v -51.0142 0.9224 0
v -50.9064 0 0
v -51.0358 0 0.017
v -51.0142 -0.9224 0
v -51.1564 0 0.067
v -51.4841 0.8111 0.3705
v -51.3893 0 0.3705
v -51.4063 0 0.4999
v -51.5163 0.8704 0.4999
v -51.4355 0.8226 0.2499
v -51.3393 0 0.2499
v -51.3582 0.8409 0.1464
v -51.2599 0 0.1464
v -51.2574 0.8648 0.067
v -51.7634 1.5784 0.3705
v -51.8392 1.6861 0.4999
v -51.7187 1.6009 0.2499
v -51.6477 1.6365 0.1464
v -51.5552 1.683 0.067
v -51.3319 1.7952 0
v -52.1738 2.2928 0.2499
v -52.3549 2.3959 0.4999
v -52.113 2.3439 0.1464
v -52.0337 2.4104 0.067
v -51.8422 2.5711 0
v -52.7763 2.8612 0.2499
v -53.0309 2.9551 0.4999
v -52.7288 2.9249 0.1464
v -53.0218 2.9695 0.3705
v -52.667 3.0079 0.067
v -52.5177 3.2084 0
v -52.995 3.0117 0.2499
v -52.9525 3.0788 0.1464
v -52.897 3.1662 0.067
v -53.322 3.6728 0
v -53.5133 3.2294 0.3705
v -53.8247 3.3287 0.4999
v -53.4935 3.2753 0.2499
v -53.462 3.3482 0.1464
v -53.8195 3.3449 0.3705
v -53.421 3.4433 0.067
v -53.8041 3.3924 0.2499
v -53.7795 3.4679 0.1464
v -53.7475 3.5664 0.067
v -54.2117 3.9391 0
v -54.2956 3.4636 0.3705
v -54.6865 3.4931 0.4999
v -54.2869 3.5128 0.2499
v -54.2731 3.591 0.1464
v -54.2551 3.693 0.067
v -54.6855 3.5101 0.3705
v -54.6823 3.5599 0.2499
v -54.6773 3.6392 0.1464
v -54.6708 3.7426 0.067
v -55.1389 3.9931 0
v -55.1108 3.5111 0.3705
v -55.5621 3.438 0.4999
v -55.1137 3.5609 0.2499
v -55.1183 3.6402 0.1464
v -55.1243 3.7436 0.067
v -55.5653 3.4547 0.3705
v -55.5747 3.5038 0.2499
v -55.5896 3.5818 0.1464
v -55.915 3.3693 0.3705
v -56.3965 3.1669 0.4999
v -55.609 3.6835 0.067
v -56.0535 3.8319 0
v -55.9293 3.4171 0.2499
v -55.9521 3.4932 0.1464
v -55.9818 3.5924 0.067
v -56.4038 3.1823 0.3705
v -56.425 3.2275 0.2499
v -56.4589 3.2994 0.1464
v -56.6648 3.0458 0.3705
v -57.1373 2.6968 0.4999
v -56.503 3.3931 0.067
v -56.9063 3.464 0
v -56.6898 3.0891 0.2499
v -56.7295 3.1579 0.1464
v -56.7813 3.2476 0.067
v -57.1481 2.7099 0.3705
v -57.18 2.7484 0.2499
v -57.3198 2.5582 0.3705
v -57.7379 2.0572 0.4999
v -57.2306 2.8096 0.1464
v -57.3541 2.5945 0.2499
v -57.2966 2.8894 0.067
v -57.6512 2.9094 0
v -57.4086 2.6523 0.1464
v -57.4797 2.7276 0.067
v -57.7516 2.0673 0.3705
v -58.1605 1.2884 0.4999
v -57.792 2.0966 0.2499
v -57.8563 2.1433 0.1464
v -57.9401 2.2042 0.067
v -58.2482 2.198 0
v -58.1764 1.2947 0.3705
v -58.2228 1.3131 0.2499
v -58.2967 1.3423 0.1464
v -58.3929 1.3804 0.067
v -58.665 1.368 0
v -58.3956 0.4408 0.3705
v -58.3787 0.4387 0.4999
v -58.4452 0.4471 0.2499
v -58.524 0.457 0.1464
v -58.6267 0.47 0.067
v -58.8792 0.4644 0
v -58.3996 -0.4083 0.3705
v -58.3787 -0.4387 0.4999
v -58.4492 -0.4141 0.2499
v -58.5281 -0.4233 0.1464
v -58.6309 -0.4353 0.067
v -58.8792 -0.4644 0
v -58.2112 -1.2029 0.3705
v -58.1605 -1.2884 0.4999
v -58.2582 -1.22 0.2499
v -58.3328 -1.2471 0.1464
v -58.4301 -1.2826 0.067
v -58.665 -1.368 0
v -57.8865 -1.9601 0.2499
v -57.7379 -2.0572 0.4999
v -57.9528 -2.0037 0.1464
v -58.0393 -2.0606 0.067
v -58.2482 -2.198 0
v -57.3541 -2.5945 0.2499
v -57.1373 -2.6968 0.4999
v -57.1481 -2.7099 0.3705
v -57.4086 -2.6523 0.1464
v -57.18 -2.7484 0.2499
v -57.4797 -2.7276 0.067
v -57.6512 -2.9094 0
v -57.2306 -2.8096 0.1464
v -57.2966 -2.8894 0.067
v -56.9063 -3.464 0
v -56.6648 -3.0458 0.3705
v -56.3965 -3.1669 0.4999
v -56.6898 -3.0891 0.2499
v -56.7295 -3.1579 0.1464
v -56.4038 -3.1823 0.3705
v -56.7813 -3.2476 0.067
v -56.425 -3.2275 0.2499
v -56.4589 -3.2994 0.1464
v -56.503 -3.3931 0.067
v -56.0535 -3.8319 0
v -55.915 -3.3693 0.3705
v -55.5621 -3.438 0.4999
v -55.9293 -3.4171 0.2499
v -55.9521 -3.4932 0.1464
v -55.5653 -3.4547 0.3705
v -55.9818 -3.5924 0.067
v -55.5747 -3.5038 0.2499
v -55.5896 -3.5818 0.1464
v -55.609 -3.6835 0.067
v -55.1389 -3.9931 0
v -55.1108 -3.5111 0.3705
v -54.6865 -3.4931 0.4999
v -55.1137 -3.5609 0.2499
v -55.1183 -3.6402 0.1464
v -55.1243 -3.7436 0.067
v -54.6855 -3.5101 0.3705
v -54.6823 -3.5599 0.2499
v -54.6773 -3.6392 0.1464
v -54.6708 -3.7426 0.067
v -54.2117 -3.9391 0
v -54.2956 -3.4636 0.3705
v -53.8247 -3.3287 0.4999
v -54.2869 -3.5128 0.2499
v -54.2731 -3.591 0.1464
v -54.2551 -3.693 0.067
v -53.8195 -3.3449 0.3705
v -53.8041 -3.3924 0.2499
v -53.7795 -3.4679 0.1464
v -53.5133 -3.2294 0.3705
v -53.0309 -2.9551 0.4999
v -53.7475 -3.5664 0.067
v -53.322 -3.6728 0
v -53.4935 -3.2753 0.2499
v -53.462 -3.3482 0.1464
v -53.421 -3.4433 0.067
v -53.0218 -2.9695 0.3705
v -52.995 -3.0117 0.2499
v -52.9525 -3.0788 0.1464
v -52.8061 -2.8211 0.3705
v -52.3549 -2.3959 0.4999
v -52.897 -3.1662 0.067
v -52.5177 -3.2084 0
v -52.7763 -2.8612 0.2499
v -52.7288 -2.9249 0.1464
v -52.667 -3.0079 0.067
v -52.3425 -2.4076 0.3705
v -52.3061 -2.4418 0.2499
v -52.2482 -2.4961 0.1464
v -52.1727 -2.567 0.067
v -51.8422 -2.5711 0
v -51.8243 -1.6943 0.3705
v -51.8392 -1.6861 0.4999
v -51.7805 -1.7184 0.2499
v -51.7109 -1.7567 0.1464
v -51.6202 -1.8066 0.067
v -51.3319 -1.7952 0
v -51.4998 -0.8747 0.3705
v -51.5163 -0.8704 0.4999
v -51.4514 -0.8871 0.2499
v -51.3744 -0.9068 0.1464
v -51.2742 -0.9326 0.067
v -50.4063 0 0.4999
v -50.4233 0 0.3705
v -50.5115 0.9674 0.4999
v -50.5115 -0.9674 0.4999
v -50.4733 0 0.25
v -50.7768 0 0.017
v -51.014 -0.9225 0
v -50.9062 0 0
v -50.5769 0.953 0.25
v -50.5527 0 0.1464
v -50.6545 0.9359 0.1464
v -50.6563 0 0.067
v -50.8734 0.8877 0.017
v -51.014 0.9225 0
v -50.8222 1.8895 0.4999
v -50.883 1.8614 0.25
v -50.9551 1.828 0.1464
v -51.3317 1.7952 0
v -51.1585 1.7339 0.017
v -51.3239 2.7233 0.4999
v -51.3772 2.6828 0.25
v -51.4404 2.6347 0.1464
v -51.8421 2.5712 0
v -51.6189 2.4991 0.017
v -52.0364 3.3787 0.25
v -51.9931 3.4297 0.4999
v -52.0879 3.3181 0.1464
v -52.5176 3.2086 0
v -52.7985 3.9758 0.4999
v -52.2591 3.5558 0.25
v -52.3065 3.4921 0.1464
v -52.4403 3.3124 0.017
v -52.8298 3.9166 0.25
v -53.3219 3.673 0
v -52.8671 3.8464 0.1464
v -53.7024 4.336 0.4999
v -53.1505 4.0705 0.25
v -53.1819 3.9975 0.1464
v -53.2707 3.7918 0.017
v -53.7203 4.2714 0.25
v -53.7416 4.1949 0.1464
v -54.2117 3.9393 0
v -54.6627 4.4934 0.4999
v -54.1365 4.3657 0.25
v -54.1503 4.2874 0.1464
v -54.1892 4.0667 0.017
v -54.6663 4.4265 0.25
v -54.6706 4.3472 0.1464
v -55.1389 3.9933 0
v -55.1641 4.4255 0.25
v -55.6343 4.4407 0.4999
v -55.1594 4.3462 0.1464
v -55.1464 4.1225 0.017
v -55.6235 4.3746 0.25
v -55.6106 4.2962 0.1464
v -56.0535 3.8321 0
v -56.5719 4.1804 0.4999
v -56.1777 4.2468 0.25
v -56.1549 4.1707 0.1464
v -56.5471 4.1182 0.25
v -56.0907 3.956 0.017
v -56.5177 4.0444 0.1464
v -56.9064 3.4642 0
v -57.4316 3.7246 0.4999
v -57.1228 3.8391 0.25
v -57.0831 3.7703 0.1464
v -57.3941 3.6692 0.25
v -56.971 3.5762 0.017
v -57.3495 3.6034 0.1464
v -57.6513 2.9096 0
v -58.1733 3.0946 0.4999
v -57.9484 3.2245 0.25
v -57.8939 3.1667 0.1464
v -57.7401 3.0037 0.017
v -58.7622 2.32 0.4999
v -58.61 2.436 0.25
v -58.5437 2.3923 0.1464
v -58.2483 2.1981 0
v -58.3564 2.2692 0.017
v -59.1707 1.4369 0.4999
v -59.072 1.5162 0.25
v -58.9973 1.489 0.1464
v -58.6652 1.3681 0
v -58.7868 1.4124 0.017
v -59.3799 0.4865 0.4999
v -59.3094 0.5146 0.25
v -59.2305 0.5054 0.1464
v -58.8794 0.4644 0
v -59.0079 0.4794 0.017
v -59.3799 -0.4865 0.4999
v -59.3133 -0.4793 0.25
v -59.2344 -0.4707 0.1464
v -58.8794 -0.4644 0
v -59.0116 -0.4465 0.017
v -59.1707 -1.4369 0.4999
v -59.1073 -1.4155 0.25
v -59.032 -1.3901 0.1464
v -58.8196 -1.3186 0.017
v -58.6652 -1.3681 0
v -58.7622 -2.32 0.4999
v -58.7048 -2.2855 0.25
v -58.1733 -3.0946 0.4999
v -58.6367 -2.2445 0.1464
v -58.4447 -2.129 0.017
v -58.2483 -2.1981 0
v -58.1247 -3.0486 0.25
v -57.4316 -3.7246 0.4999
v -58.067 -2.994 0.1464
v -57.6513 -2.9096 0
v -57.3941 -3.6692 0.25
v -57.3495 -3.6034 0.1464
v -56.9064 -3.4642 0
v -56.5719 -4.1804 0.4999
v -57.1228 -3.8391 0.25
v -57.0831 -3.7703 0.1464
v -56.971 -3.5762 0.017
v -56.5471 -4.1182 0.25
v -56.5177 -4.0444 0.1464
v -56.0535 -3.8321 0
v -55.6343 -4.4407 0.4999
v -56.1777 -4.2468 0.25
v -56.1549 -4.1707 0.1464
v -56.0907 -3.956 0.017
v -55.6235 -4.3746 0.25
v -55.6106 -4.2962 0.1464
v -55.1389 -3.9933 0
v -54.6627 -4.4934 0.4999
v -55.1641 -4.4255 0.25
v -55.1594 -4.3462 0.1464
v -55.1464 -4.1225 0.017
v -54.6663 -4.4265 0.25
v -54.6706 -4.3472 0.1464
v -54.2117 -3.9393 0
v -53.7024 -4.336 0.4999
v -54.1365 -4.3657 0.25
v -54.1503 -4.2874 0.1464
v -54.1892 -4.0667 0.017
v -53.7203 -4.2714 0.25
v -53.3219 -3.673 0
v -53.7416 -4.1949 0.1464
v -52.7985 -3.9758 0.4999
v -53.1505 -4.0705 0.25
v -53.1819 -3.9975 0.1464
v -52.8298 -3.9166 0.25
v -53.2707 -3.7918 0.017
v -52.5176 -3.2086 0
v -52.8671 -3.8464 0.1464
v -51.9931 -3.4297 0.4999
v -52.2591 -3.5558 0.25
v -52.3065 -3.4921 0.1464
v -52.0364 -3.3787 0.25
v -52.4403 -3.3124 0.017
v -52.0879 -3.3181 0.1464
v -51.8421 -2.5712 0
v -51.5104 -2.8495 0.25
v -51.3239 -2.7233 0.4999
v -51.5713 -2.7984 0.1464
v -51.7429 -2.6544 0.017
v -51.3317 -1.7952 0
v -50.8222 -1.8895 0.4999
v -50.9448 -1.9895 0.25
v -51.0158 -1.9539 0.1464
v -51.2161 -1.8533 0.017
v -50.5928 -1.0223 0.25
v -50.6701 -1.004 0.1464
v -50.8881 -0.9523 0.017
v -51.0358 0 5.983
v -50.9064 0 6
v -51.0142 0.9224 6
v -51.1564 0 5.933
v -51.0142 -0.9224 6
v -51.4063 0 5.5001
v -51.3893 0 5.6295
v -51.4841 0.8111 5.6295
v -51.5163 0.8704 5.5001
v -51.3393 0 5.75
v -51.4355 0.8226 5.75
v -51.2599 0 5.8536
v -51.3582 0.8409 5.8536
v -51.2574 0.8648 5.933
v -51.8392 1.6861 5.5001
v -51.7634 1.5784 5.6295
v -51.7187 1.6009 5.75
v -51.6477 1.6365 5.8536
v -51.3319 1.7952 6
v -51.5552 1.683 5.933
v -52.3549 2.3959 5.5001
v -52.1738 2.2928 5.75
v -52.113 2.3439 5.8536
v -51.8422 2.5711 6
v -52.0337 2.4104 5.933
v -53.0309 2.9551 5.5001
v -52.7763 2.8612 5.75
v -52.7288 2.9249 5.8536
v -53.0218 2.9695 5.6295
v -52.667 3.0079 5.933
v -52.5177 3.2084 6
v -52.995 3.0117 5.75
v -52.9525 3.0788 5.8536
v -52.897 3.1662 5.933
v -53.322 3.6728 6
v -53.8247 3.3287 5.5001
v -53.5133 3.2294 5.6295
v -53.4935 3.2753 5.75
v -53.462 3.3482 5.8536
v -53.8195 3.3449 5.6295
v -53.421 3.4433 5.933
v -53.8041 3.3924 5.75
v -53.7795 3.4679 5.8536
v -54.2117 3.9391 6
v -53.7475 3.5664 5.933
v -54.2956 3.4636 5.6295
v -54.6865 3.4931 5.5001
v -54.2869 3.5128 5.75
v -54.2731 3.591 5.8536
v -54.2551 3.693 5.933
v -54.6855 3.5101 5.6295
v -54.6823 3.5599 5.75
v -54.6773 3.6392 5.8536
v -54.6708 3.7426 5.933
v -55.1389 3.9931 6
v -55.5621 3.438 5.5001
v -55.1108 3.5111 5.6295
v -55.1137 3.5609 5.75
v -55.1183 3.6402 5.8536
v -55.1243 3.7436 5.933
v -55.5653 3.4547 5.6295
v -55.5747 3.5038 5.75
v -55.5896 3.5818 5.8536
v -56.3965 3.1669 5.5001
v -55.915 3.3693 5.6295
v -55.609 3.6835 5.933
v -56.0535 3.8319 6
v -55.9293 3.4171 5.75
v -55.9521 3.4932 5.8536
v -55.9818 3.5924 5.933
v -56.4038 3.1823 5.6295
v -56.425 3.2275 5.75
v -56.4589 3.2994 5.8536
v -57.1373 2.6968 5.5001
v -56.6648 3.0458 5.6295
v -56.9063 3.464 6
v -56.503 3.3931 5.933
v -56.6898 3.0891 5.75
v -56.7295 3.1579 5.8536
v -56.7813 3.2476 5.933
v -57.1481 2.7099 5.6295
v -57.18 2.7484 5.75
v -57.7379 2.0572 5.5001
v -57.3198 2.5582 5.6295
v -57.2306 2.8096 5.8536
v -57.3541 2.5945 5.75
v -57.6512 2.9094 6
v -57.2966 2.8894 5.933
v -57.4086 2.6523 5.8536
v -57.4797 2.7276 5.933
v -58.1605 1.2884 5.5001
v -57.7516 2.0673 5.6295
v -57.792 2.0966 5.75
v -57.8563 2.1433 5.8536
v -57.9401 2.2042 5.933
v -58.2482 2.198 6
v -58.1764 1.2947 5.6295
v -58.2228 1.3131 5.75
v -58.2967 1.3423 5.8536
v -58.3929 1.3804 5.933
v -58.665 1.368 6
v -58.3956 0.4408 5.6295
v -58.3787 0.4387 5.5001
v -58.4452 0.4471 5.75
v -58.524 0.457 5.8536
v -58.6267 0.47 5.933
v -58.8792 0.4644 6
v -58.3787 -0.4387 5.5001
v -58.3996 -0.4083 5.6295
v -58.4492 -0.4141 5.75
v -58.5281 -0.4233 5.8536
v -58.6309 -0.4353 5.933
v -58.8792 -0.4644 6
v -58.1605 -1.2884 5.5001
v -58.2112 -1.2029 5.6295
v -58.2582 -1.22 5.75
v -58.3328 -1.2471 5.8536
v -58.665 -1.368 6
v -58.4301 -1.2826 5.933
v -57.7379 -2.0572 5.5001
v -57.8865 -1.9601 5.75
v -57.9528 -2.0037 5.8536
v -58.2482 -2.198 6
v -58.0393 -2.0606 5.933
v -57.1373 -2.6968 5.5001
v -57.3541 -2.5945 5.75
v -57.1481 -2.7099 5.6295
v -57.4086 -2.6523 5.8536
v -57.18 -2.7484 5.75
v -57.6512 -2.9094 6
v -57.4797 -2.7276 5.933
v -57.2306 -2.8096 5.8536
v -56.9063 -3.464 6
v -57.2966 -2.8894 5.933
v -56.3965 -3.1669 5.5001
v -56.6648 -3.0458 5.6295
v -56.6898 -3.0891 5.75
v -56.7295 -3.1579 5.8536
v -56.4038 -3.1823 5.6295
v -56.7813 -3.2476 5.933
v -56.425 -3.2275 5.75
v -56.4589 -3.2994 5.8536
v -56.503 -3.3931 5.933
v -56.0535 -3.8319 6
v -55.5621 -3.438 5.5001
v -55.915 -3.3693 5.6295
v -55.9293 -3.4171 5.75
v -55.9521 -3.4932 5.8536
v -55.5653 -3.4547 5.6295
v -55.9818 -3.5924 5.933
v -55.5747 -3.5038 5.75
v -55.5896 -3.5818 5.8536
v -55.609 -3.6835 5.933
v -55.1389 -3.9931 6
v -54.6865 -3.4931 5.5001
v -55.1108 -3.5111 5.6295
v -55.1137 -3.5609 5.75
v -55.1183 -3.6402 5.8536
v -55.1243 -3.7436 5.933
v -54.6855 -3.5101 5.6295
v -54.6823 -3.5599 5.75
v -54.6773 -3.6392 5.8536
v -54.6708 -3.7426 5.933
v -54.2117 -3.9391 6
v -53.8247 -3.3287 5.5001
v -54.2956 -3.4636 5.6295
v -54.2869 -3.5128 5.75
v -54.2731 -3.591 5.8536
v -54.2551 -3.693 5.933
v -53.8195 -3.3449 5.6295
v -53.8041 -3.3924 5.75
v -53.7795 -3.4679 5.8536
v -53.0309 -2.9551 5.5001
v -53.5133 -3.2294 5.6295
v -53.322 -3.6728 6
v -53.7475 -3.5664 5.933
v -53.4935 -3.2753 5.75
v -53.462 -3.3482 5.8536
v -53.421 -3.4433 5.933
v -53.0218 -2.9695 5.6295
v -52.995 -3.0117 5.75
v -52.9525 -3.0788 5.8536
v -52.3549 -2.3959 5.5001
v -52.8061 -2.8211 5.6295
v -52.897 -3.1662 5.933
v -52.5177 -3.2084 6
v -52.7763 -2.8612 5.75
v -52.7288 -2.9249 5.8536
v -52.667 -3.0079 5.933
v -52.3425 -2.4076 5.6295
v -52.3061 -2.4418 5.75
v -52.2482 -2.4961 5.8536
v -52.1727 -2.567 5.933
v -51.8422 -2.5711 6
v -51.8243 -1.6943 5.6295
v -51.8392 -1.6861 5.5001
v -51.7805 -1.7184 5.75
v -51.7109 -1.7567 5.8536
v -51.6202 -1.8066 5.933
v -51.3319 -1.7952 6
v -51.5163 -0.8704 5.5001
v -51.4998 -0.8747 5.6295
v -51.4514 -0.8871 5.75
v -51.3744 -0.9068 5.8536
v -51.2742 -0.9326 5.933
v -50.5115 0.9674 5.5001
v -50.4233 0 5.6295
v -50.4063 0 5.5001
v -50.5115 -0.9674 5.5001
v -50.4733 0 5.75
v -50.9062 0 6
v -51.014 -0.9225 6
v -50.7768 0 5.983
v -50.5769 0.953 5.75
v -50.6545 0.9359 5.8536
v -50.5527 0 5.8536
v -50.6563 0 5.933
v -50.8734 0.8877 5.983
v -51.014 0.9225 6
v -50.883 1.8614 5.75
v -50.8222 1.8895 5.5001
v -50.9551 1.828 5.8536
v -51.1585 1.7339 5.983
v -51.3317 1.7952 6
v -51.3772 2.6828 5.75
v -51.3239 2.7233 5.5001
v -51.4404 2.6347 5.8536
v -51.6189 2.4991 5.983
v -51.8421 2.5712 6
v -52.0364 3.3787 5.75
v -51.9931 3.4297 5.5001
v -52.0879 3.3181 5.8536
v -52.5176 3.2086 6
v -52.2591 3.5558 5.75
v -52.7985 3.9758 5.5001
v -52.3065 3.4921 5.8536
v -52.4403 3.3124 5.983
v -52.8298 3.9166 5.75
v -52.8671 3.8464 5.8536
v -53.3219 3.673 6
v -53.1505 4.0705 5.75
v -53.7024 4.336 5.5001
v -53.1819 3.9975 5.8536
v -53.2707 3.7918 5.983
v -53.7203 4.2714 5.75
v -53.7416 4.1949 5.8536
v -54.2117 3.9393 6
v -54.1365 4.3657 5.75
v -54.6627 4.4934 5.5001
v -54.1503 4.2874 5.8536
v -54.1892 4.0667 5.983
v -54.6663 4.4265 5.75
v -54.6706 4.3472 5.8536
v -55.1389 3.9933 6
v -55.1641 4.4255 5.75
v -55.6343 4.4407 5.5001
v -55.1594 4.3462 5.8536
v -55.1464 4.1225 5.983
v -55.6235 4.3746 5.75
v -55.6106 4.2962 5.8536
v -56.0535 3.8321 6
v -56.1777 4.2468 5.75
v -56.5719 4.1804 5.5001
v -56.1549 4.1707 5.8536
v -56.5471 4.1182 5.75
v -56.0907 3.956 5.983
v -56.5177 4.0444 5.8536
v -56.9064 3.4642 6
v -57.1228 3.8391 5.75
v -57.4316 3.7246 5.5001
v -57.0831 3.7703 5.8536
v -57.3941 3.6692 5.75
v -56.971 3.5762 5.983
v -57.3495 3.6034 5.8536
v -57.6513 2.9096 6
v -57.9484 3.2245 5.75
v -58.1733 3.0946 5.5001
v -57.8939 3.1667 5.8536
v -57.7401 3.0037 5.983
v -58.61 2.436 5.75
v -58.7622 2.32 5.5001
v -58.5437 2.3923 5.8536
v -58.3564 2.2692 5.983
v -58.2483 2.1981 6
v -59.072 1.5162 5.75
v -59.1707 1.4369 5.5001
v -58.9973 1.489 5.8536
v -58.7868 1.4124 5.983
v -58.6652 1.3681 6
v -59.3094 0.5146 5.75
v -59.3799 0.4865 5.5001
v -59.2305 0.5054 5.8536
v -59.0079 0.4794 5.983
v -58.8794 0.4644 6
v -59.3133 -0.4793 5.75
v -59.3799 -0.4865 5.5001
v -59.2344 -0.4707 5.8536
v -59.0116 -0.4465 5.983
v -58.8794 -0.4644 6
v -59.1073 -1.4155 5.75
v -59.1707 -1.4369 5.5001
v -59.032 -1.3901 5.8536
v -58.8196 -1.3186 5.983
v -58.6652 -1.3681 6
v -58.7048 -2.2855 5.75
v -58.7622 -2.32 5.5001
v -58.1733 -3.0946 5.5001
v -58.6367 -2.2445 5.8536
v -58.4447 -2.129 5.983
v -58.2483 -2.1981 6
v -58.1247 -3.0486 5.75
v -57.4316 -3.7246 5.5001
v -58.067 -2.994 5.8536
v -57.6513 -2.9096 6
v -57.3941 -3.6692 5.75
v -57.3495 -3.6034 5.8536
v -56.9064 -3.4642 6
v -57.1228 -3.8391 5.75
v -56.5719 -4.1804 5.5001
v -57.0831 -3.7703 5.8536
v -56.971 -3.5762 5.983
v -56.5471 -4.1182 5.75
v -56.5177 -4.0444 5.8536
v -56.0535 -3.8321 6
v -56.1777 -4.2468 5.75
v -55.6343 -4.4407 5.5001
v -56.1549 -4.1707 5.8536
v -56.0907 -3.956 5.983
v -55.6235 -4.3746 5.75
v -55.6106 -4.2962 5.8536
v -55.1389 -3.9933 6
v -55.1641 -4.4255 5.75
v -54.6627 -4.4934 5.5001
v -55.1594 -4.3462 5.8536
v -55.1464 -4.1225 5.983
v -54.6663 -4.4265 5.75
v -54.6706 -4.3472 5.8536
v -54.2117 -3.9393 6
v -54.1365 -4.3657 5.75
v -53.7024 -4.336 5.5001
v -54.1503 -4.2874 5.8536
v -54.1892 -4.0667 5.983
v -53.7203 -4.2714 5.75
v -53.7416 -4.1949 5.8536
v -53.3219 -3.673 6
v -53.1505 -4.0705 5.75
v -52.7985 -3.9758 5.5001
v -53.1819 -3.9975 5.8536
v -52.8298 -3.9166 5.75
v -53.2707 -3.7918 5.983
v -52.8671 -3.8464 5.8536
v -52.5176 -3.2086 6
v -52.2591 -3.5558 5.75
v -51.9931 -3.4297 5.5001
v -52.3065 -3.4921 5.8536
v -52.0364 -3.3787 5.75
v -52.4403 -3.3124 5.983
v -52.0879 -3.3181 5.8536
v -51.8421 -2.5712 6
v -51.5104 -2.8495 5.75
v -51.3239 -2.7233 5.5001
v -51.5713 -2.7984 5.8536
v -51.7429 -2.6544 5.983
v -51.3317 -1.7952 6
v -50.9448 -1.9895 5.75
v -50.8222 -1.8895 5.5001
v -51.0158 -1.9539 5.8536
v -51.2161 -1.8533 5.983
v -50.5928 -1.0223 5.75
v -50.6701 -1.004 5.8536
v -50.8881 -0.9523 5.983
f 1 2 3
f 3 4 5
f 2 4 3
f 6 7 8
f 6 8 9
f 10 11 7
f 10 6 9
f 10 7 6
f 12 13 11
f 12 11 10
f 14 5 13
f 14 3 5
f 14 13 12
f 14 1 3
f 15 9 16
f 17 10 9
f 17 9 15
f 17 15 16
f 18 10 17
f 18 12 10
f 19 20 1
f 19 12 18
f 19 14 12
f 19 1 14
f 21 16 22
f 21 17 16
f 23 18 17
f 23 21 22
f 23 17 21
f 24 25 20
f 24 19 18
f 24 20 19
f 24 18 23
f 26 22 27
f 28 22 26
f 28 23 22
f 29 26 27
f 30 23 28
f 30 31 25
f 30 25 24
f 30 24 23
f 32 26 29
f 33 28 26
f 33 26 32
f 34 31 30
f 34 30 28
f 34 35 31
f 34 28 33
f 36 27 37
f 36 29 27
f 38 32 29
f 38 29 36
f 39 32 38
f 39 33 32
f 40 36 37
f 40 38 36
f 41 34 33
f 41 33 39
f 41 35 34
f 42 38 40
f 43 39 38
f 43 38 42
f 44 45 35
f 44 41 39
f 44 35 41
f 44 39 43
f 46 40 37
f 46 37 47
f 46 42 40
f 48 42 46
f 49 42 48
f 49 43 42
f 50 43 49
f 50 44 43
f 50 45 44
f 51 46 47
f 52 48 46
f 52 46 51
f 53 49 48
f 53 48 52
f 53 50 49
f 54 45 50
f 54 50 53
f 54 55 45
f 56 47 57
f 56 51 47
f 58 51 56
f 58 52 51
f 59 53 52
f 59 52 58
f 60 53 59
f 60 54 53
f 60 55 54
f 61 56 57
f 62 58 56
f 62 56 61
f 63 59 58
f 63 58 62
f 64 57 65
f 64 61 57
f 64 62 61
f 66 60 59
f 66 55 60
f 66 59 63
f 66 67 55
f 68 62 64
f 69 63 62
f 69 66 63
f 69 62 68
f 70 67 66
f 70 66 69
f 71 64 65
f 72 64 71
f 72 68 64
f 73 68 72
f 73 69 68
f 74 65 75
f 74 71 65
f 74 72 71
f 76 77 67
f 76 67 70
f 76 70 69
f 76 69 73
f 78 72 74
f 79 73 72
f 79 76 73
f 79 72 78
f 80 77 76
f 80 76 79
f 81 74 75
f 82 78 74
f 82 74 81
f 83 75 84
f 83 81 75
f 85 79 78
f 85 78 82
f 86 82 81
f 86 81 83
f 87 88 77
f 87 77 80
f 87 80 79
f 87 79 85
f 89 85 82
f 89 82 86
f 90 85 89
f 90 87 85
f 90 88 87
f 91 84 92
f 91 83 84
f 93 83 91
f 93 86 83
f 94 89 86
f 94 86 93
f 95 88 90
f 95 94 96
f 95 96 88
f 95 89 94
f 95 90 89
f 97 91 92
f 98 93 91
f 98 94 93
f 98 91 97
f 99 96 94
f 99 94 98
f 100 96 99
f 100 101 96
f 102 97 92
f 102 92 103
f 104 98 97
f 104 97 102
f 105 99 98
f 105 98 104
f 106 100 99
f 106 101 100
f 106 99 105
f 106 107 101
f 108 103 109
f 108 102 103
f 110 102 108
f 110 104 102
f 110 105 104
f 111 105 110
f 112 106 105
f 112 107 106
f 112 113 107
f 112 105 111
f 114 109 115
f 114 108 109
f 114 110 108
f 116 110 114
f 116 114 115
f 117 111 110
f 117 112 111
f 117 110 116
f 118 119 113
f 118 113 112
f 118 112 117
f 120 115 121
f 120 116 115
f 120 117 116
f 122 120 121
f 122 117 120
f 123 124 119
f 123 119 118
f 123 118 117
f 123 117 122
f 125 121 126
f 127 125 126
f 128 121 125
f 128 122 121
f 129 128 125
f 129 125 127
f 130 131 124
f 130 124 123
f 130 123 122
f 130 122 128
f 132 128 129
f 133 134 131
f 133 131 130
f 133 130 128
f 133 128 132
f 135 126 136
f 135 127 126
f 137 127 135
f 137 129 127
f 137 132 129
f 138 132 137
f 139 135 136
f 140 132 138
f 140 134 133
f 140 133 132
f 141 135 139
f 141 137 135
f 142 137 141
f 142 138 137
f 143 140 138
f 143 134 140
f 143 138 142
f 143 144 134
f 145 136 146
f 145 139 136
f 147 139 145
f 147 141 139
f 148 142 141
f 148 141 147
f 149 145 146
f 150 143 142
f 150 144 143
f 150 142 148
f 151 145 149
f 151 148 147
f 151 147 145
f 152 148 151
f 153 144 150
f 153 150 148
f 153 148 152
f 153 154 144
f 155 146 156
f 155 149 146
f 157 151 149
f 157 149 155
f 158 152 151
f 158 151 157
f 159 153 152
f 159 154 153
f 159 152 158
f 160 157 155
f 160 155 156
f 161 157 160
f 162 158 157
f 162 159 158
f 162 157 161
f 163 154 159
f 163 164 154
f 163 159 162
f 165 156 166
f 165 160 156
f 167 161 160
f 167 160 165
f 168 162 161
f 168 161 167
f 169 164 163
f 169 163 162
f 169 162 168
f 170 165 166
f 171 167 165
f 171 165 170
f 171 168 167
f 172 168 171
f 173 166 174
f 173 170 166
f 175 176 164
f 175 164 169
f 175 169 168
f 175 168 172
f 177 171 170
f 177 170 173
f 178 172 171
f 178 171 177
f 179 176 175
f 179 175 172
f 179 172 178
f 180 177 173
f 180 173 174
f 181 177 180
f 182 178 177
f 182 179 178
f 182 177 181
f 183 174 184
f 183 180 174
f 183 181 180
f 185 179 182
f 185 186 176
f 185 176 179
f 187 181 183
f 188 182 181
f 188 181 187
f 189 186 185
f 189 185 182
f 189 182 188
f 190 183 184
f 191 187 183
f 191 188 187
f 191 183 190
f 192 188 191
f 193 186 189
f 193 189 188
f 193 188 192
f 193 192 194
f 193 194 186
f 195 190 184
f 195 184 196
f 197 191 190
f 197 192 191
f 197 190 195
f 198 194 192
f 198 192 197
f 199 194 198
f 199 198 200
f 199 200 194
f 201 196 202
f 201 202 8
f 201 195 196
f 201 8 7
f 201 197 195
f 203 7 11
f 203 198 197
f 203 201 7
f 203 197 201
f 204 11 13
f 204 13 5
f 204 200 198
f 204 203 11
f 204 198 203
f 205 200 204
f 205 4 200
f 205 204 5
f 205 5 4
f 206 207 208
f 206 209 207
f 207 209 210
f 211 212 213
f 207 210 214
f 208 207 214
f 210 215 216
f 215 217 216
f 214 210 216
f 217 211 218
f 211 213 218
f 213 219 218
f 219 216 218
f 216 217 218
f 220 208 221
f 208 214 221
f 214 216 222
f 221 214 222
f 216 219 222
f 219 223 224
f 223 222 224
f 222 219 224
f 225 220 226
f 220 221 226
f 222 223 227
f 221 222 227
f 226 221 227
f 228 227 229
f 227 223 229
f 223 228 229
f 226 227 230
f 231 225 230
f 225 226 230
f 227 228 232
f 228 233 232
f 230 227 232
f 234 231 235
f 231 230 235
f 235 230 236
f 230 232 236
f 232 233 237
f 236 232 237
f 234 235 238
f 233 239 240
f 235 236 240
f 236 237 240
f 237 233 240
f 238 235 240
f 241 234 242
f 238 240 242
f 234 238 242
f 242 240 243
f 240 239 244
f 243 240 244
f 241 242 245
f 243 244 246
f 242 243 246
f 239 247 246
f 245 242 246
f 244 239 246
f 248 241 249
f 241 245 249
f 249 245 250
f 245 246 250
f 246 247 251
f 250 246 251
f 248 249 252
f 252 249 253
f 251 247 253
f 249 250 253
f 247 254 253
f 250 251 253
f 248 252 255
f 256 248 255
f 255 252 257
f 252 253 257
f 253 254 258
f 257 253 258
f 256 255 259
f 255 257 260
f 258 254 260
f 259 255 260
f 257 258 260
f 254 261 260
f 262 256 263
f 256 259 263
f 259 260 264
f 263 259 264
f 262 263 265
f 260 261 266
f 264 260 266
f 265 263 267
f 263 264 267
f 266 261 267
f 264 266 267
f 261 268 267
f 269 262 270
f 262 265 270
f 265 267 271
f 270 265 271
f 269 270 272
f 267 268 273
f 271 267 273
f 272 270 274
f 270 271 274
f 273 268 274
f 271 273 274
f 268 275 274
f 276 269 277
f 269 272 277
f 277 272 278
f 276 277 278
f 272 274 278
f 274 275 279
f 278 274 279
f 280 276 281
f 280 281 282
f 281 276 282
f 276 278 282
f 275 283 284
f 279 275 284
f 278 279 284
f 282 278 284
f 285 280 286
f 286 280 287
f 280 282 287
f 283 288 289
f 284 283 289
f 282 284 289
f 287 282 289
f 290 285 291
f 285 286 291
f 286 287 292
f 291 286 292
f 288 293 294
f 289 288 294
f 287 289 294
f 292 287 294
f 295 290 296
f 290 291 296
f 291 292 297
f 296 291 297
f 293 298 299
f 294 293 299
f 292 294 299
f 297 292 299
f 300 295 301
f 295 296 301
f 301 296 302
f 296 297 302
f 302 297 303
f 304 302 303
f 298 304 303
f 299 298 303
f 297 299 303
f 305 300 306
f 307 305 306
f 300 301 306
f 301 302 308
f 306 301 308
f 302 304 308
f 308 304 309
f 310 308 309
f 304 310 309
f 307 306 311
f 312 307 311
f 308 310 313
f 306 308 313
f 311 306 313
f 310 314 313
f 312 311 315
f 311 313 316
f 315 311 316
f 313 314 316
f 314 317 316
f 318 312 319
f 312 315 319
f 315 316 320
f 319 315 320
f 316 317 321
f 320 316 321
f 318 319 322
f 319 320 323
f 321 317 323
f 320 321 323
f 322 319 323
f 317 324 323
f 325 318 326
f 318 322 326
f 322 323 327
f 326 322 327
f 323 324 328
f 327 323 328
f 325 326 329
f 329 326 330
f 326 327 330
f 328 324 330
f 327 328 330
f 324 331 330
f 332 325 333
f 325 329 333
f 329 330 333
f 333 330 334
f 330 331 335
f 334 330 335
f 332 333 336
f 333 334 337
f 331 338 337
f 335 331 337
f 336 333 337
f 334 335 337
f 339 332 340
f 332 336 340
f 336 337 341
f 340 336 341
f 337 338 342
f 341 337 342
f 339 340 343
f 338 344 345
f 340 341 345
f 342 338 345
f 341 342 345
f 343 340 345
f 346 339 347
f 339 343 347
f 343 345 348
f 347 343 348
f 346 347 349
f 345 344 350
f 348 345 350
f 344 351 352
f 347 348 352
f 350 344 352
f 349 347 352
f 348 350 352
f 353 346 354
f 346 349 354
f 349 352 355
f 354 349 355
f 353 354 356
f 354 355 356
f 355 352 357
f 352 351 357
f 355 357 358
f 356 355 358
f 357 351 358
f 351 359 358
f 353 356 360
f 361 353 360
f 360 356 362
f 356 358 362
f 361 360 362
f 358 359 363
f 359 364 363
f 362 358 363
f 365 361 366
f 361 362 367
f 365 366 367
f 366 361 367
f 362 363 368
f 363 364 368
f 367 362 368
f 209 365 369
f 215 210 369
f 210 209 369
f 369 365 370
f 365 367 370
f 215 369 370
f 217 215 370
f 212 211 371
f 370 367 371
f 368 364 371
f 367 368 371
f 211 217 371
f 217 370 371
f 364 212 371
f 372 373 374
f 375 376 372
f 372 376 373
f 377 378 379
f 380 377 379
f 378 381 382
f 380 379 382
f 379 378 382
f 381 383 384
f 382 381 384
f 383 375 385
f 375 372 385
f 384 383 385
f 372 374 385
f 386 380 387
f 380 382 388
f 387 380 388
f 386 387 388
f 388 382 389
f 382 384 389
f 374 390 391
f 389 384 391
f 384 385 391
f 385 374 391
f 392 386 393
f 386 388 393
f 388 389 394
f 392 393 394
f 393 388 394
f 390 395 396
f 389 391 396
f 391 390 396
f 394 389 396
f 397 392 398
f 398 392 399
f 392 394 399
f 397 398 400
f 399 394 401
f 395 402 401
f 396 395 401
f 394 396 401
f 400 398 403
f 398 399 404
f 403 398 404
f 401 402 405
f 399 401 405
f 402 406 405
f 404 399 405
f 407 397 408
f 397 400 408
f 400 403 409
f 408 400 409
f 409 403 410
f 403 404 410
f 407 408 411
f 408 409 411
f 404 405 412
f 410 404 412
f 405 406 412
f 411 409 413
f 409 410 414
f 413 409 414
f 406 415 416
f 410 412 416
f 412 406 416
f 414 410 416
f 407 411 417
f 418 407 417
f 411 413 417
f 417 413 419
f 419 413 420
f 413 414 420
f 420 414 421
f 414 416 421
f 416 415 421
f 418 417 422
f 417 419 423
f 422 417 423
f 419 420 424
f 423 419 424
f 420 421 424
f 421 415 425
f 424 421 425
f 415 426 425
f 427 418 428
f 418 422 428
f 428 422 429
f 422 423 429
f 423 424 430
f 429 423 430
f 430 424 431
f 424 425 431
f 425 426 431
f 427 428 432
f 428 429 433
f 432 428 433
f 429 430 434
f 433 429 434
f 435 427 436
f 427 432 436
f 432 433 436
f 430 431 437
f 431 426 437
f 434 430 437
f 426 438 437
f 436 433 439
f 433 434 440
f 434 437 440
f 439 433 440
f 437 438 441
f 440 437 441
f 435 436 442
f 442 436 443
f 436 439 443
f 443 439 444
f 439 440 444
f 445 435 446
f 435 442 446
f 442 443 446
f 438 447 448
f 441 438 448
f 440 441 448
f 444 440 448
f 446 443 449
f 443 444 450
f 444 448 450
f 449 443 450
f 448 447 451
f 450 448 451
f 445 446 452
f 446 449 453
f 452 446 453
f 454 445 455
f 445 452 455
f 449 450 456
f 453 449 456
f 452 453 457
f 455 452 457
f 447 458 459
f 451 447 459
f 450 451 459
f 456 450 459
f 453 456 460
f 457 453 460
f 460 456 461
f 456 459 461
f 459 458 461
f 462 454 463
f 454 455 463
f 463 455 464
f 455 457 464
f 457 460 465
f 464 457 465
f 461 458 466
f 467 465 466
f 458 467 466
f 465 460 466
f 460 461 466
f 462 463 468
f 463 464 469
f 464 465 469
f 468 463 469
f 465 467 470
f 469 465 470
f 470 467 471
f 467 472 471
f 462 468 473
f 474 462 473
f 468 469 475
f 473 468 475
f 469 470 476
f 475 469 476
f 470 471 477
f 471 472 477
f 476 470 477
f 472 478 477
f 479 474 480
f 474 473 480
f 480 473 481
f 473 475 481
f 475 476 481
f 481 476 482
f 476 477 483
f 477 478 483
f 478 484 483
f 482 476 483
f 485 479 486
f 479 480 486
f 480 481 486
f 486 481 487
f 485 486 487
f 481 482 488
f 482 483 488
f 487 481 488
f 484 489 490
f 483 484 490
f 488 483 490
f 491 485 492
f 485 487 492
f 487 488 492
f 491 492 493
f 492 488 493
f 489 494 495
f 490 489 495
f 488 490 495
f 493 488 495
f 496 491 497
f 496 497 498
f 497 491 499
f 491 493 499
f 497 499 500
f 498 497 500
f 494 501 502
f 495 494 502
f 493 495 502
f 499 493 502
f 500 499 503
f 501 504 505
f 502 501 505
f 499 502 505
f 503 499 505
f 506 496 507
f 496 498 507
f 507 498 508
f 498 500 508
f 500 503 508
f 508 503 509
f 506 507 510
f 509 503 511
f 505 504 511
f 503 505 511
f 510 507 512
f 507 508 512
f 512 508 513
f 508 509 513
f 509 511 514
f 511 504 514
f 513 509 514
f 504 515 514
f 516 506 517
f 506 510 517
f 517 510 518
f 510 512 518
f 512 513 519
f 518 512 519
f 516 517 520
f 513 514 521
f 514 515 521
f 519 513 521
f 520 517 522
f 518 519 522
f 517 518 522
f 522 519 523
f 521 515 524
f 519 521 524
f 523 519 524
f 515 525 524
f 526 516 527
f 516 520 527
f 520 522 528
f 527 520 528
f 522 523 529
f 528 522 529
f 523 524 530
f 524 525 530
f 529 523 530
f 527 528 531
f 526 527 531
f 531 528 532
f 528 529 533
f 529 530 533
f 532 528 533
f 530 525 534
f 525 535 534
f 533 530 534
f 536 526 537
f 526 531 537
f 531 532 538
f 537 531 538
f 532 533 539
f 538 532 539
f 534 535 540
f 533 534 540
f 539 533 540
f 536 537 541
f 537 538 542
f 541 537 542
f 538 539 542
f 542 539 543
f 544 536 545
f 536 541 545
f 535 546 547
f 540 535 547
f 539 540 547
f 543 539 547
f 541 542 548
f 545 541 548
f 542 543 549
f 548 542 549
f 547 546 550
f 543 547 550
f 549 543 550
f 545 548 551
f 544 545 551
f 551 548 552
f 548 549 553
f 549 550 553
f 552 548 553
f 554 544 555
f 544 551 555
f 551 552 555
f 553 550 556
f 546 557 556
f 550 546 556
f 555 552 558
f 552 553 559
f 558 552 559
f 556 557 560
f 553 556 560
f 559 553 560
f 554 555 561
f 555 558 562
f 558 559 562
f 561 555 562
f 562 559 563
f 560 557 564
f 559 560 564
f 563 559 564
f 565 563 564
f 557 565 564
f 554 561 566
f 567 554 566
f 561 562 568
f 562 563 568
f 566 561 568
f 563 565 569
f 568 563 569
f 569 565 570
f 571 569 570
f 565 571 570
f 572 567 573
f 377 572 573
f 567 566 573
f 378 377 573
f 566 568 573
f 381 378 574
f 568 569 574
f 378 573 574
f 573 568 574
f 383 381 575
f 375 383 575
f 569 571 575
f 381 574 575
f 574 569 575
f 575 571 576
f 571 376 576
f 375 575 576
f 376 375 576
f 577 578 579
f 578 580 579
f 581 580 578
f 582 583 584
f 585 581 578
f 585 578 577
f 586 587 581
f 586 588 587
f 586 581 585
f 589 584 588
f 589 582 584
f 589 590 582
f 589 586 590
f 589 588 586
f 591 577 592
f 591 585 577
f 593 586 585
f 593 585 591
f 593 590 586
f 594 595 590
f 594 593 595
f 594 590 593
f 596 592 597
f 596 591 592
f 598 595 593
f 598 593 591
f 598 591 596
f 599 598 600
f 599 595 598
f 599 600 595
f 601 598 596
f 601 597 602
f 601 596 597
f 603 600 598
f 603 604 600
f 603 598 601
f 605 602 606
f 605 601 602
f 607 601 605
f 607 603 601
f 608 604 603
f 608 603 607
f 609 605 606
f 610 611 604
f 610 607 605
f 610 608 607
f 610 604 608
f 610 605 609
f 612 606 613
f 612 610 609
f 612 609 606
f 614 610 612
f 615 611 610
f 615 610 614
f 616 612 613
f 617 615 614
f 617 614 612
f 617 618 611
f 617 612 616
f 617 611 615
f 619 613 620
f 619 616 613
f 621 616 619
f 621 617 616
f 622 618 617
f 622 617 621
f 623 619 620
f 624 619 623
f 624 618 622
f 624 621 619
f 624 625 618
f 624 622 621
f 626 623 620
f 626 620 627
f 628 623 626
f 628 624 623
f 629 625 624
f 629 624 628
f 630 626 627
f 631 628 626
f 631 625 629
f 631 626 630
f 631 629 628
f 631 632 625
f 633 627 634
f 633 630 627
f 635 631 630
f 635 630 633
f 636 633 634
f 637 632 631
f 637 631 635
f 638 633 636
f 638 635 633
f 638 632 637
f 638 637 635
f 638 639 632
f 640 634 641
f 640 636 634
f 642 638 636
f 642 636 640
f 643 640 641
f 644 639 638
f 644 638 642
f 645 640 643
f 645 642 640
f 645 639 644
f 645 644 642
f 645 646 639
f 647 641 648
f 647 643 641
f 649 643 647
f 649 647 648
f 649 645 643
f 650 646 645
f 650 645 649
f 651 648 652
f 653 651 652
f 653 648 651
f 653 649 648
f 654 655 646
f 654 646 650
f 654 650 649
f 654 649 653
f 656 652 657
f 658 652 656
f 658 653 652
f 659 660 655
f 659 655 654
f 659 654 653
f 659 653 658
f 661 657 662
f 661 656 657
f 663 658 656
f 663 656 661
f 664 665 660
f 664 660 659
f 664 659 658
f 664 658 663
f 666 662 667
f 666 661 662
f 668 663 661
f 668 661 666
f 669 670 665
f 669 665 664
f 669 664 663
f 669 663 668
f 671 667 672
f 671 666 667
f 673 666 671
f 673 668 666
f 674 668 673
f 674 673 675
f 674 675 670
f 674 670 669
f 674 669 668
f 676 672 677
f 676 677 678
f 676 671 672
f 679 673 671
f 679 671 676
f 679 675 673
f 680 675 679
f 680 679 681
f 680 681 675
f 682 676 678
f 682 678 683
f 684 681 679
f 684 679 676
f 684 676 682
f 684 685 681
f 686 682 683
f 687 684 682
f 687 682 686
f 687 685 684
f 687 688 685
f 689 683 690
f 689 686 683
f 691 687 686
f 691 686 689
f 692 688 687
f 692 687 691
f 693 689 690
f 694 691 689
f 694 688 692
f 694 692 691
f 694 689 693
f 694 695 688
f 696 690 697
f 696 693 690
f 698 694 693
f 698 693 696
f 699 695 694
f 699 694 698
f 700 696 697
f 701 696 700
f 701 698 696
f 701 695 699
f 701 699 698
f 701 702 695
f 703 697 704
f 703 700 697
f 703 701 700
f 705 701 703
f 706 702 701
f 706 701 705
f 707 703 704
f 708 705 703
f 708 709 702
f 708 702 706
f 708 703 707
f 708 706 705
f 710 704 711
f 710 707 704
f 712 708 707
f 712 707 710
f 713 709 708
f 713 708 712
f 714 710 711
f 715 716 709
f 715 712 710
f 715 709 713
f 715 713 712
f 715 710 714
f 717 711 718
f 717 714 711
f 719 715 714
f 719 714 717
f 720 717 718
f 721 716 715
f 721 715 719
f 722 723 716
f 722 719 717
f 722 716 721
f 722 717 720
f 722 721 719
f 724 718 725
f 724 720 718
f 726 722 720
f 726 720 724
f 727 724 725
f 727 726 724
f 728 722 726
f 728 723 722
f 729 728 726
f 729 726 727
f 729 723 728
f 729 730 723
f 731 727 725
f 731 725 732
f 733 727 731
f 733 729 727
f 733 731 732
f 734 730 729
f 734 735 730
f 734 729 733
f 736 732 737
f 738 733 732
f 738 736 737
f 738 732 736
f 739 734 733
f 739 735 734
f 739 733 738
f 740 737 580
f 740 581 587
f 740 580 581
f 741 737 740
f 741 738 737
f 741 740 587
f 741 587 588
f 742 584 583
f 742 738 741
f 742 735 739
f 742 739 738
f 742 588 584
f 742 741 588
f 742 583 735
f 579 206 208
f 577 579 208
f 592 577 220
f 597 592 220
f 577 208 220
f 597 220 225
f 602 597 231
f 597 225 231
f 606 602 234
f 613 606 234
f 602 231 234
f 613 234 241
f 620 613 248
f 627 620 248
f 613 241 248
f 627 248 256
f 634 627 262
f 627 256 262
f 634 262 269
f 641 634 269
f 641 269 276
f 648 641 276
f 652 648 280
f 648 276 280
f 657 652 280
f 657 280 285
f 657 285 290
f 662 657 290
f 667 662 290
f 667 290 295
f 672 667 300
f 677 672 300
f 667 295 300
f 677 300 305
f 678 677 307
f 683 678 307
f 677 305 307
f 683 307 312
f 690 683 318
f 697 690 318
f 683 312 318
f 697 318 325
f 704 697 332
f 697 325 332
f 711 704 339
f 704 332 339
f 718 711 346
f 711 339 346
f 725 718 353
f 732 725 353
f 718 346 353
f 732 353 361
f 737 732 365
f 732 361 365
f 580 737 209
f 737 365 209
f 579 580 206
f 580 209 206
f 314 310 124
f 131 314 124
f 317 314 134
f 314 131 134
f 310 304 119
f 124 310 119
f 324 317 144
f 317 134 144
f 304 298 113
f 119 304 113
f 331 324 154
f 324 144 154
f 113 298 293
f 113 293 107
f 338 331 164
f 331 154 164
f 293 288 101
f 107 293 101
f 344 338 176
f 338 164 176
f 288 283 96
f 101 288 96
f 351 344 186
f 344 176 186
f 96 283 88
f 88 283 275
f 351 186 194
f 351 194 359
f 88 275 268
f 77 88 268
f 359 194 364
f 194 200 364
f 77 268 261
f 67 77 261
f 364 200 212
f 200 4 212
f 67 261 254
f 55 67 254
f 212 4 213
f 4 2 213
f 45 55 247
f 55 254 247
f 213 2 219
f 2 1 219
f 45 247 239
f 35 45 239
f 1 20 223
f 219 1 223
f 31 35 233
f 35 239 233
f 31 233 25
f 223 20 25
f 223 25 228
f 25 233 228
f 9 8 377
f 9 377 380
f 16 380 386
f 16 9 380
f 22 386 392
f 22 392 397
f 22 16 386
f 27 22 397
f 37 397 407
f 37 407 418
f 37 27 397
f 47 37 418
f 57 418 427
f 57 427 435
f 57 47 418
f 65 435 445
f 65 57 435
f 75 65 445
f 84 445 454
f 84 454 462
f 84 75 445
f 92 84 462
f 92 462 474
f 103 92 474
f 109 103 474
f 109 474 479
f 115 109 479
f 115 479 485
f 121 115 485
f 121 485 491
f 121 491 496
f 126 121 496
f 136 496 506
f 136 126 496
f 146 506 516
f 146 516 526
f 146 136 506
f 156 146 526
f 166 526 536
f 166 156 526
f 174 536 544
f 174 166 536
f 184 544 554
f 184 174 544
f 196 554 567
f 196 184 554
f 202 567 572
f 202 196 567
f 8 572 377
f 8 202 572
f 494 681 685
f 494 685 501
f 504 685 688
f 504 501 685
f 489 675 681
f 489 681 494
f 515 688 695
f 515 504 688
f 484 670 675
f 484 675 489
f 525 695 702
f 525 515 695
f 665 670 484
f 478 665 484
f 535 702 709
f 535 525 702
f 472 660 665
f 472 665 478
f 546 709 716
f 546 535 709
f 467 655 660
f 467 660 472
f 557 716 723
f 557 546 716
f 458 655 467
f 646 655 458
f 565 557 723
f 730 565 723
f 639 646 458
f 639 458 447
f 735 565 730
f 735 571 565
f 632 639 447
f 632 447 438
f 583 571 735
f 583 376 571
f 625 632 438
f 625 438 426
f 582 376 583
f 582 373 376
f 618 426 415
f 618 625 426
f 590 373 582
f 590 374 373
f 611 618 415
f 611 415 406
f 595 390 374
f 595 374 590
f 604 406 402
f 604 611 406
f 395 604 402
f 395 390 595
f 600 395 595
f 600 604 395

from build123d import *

# Parameters (mm, degrees)
SKETCH1_R           = 4.5
SKETCH1_R_2         = 3.5
BOSS_EXTRUDE1_DEPTH = 6
FILLET1_R           = 0.5


with BuildPart() as part:
    # Sketch1 → Boss-Extrude1 (new body)
    with BuildSketch(Plane.XY):
        with Locations((-54.906305706, 0)):
            Circle(SKETCH1_R)
        with Locations((-54.906305706, 0)):
            Circle(SKETCH1_R_2, mode=Mode.SUBTRACT)
    extrude(amount=BOSS_EXTRUDE1_DEPTH)

    # Fillet1
    fillet1_edges = [part.edges().sort_by_distance(p)[0] for p in [
        (-59.406305706, 0, 0),
        (-59.406305706, 0, 6),
        (-58.406305706, 0, 0),
        (-58.406305706, 0, 6),
    ]]
    fillet(fillet1_edges, radius=FILLET1_R - 0.0001)  # a hair under: the kernel refuses the full size


solid = part.part
